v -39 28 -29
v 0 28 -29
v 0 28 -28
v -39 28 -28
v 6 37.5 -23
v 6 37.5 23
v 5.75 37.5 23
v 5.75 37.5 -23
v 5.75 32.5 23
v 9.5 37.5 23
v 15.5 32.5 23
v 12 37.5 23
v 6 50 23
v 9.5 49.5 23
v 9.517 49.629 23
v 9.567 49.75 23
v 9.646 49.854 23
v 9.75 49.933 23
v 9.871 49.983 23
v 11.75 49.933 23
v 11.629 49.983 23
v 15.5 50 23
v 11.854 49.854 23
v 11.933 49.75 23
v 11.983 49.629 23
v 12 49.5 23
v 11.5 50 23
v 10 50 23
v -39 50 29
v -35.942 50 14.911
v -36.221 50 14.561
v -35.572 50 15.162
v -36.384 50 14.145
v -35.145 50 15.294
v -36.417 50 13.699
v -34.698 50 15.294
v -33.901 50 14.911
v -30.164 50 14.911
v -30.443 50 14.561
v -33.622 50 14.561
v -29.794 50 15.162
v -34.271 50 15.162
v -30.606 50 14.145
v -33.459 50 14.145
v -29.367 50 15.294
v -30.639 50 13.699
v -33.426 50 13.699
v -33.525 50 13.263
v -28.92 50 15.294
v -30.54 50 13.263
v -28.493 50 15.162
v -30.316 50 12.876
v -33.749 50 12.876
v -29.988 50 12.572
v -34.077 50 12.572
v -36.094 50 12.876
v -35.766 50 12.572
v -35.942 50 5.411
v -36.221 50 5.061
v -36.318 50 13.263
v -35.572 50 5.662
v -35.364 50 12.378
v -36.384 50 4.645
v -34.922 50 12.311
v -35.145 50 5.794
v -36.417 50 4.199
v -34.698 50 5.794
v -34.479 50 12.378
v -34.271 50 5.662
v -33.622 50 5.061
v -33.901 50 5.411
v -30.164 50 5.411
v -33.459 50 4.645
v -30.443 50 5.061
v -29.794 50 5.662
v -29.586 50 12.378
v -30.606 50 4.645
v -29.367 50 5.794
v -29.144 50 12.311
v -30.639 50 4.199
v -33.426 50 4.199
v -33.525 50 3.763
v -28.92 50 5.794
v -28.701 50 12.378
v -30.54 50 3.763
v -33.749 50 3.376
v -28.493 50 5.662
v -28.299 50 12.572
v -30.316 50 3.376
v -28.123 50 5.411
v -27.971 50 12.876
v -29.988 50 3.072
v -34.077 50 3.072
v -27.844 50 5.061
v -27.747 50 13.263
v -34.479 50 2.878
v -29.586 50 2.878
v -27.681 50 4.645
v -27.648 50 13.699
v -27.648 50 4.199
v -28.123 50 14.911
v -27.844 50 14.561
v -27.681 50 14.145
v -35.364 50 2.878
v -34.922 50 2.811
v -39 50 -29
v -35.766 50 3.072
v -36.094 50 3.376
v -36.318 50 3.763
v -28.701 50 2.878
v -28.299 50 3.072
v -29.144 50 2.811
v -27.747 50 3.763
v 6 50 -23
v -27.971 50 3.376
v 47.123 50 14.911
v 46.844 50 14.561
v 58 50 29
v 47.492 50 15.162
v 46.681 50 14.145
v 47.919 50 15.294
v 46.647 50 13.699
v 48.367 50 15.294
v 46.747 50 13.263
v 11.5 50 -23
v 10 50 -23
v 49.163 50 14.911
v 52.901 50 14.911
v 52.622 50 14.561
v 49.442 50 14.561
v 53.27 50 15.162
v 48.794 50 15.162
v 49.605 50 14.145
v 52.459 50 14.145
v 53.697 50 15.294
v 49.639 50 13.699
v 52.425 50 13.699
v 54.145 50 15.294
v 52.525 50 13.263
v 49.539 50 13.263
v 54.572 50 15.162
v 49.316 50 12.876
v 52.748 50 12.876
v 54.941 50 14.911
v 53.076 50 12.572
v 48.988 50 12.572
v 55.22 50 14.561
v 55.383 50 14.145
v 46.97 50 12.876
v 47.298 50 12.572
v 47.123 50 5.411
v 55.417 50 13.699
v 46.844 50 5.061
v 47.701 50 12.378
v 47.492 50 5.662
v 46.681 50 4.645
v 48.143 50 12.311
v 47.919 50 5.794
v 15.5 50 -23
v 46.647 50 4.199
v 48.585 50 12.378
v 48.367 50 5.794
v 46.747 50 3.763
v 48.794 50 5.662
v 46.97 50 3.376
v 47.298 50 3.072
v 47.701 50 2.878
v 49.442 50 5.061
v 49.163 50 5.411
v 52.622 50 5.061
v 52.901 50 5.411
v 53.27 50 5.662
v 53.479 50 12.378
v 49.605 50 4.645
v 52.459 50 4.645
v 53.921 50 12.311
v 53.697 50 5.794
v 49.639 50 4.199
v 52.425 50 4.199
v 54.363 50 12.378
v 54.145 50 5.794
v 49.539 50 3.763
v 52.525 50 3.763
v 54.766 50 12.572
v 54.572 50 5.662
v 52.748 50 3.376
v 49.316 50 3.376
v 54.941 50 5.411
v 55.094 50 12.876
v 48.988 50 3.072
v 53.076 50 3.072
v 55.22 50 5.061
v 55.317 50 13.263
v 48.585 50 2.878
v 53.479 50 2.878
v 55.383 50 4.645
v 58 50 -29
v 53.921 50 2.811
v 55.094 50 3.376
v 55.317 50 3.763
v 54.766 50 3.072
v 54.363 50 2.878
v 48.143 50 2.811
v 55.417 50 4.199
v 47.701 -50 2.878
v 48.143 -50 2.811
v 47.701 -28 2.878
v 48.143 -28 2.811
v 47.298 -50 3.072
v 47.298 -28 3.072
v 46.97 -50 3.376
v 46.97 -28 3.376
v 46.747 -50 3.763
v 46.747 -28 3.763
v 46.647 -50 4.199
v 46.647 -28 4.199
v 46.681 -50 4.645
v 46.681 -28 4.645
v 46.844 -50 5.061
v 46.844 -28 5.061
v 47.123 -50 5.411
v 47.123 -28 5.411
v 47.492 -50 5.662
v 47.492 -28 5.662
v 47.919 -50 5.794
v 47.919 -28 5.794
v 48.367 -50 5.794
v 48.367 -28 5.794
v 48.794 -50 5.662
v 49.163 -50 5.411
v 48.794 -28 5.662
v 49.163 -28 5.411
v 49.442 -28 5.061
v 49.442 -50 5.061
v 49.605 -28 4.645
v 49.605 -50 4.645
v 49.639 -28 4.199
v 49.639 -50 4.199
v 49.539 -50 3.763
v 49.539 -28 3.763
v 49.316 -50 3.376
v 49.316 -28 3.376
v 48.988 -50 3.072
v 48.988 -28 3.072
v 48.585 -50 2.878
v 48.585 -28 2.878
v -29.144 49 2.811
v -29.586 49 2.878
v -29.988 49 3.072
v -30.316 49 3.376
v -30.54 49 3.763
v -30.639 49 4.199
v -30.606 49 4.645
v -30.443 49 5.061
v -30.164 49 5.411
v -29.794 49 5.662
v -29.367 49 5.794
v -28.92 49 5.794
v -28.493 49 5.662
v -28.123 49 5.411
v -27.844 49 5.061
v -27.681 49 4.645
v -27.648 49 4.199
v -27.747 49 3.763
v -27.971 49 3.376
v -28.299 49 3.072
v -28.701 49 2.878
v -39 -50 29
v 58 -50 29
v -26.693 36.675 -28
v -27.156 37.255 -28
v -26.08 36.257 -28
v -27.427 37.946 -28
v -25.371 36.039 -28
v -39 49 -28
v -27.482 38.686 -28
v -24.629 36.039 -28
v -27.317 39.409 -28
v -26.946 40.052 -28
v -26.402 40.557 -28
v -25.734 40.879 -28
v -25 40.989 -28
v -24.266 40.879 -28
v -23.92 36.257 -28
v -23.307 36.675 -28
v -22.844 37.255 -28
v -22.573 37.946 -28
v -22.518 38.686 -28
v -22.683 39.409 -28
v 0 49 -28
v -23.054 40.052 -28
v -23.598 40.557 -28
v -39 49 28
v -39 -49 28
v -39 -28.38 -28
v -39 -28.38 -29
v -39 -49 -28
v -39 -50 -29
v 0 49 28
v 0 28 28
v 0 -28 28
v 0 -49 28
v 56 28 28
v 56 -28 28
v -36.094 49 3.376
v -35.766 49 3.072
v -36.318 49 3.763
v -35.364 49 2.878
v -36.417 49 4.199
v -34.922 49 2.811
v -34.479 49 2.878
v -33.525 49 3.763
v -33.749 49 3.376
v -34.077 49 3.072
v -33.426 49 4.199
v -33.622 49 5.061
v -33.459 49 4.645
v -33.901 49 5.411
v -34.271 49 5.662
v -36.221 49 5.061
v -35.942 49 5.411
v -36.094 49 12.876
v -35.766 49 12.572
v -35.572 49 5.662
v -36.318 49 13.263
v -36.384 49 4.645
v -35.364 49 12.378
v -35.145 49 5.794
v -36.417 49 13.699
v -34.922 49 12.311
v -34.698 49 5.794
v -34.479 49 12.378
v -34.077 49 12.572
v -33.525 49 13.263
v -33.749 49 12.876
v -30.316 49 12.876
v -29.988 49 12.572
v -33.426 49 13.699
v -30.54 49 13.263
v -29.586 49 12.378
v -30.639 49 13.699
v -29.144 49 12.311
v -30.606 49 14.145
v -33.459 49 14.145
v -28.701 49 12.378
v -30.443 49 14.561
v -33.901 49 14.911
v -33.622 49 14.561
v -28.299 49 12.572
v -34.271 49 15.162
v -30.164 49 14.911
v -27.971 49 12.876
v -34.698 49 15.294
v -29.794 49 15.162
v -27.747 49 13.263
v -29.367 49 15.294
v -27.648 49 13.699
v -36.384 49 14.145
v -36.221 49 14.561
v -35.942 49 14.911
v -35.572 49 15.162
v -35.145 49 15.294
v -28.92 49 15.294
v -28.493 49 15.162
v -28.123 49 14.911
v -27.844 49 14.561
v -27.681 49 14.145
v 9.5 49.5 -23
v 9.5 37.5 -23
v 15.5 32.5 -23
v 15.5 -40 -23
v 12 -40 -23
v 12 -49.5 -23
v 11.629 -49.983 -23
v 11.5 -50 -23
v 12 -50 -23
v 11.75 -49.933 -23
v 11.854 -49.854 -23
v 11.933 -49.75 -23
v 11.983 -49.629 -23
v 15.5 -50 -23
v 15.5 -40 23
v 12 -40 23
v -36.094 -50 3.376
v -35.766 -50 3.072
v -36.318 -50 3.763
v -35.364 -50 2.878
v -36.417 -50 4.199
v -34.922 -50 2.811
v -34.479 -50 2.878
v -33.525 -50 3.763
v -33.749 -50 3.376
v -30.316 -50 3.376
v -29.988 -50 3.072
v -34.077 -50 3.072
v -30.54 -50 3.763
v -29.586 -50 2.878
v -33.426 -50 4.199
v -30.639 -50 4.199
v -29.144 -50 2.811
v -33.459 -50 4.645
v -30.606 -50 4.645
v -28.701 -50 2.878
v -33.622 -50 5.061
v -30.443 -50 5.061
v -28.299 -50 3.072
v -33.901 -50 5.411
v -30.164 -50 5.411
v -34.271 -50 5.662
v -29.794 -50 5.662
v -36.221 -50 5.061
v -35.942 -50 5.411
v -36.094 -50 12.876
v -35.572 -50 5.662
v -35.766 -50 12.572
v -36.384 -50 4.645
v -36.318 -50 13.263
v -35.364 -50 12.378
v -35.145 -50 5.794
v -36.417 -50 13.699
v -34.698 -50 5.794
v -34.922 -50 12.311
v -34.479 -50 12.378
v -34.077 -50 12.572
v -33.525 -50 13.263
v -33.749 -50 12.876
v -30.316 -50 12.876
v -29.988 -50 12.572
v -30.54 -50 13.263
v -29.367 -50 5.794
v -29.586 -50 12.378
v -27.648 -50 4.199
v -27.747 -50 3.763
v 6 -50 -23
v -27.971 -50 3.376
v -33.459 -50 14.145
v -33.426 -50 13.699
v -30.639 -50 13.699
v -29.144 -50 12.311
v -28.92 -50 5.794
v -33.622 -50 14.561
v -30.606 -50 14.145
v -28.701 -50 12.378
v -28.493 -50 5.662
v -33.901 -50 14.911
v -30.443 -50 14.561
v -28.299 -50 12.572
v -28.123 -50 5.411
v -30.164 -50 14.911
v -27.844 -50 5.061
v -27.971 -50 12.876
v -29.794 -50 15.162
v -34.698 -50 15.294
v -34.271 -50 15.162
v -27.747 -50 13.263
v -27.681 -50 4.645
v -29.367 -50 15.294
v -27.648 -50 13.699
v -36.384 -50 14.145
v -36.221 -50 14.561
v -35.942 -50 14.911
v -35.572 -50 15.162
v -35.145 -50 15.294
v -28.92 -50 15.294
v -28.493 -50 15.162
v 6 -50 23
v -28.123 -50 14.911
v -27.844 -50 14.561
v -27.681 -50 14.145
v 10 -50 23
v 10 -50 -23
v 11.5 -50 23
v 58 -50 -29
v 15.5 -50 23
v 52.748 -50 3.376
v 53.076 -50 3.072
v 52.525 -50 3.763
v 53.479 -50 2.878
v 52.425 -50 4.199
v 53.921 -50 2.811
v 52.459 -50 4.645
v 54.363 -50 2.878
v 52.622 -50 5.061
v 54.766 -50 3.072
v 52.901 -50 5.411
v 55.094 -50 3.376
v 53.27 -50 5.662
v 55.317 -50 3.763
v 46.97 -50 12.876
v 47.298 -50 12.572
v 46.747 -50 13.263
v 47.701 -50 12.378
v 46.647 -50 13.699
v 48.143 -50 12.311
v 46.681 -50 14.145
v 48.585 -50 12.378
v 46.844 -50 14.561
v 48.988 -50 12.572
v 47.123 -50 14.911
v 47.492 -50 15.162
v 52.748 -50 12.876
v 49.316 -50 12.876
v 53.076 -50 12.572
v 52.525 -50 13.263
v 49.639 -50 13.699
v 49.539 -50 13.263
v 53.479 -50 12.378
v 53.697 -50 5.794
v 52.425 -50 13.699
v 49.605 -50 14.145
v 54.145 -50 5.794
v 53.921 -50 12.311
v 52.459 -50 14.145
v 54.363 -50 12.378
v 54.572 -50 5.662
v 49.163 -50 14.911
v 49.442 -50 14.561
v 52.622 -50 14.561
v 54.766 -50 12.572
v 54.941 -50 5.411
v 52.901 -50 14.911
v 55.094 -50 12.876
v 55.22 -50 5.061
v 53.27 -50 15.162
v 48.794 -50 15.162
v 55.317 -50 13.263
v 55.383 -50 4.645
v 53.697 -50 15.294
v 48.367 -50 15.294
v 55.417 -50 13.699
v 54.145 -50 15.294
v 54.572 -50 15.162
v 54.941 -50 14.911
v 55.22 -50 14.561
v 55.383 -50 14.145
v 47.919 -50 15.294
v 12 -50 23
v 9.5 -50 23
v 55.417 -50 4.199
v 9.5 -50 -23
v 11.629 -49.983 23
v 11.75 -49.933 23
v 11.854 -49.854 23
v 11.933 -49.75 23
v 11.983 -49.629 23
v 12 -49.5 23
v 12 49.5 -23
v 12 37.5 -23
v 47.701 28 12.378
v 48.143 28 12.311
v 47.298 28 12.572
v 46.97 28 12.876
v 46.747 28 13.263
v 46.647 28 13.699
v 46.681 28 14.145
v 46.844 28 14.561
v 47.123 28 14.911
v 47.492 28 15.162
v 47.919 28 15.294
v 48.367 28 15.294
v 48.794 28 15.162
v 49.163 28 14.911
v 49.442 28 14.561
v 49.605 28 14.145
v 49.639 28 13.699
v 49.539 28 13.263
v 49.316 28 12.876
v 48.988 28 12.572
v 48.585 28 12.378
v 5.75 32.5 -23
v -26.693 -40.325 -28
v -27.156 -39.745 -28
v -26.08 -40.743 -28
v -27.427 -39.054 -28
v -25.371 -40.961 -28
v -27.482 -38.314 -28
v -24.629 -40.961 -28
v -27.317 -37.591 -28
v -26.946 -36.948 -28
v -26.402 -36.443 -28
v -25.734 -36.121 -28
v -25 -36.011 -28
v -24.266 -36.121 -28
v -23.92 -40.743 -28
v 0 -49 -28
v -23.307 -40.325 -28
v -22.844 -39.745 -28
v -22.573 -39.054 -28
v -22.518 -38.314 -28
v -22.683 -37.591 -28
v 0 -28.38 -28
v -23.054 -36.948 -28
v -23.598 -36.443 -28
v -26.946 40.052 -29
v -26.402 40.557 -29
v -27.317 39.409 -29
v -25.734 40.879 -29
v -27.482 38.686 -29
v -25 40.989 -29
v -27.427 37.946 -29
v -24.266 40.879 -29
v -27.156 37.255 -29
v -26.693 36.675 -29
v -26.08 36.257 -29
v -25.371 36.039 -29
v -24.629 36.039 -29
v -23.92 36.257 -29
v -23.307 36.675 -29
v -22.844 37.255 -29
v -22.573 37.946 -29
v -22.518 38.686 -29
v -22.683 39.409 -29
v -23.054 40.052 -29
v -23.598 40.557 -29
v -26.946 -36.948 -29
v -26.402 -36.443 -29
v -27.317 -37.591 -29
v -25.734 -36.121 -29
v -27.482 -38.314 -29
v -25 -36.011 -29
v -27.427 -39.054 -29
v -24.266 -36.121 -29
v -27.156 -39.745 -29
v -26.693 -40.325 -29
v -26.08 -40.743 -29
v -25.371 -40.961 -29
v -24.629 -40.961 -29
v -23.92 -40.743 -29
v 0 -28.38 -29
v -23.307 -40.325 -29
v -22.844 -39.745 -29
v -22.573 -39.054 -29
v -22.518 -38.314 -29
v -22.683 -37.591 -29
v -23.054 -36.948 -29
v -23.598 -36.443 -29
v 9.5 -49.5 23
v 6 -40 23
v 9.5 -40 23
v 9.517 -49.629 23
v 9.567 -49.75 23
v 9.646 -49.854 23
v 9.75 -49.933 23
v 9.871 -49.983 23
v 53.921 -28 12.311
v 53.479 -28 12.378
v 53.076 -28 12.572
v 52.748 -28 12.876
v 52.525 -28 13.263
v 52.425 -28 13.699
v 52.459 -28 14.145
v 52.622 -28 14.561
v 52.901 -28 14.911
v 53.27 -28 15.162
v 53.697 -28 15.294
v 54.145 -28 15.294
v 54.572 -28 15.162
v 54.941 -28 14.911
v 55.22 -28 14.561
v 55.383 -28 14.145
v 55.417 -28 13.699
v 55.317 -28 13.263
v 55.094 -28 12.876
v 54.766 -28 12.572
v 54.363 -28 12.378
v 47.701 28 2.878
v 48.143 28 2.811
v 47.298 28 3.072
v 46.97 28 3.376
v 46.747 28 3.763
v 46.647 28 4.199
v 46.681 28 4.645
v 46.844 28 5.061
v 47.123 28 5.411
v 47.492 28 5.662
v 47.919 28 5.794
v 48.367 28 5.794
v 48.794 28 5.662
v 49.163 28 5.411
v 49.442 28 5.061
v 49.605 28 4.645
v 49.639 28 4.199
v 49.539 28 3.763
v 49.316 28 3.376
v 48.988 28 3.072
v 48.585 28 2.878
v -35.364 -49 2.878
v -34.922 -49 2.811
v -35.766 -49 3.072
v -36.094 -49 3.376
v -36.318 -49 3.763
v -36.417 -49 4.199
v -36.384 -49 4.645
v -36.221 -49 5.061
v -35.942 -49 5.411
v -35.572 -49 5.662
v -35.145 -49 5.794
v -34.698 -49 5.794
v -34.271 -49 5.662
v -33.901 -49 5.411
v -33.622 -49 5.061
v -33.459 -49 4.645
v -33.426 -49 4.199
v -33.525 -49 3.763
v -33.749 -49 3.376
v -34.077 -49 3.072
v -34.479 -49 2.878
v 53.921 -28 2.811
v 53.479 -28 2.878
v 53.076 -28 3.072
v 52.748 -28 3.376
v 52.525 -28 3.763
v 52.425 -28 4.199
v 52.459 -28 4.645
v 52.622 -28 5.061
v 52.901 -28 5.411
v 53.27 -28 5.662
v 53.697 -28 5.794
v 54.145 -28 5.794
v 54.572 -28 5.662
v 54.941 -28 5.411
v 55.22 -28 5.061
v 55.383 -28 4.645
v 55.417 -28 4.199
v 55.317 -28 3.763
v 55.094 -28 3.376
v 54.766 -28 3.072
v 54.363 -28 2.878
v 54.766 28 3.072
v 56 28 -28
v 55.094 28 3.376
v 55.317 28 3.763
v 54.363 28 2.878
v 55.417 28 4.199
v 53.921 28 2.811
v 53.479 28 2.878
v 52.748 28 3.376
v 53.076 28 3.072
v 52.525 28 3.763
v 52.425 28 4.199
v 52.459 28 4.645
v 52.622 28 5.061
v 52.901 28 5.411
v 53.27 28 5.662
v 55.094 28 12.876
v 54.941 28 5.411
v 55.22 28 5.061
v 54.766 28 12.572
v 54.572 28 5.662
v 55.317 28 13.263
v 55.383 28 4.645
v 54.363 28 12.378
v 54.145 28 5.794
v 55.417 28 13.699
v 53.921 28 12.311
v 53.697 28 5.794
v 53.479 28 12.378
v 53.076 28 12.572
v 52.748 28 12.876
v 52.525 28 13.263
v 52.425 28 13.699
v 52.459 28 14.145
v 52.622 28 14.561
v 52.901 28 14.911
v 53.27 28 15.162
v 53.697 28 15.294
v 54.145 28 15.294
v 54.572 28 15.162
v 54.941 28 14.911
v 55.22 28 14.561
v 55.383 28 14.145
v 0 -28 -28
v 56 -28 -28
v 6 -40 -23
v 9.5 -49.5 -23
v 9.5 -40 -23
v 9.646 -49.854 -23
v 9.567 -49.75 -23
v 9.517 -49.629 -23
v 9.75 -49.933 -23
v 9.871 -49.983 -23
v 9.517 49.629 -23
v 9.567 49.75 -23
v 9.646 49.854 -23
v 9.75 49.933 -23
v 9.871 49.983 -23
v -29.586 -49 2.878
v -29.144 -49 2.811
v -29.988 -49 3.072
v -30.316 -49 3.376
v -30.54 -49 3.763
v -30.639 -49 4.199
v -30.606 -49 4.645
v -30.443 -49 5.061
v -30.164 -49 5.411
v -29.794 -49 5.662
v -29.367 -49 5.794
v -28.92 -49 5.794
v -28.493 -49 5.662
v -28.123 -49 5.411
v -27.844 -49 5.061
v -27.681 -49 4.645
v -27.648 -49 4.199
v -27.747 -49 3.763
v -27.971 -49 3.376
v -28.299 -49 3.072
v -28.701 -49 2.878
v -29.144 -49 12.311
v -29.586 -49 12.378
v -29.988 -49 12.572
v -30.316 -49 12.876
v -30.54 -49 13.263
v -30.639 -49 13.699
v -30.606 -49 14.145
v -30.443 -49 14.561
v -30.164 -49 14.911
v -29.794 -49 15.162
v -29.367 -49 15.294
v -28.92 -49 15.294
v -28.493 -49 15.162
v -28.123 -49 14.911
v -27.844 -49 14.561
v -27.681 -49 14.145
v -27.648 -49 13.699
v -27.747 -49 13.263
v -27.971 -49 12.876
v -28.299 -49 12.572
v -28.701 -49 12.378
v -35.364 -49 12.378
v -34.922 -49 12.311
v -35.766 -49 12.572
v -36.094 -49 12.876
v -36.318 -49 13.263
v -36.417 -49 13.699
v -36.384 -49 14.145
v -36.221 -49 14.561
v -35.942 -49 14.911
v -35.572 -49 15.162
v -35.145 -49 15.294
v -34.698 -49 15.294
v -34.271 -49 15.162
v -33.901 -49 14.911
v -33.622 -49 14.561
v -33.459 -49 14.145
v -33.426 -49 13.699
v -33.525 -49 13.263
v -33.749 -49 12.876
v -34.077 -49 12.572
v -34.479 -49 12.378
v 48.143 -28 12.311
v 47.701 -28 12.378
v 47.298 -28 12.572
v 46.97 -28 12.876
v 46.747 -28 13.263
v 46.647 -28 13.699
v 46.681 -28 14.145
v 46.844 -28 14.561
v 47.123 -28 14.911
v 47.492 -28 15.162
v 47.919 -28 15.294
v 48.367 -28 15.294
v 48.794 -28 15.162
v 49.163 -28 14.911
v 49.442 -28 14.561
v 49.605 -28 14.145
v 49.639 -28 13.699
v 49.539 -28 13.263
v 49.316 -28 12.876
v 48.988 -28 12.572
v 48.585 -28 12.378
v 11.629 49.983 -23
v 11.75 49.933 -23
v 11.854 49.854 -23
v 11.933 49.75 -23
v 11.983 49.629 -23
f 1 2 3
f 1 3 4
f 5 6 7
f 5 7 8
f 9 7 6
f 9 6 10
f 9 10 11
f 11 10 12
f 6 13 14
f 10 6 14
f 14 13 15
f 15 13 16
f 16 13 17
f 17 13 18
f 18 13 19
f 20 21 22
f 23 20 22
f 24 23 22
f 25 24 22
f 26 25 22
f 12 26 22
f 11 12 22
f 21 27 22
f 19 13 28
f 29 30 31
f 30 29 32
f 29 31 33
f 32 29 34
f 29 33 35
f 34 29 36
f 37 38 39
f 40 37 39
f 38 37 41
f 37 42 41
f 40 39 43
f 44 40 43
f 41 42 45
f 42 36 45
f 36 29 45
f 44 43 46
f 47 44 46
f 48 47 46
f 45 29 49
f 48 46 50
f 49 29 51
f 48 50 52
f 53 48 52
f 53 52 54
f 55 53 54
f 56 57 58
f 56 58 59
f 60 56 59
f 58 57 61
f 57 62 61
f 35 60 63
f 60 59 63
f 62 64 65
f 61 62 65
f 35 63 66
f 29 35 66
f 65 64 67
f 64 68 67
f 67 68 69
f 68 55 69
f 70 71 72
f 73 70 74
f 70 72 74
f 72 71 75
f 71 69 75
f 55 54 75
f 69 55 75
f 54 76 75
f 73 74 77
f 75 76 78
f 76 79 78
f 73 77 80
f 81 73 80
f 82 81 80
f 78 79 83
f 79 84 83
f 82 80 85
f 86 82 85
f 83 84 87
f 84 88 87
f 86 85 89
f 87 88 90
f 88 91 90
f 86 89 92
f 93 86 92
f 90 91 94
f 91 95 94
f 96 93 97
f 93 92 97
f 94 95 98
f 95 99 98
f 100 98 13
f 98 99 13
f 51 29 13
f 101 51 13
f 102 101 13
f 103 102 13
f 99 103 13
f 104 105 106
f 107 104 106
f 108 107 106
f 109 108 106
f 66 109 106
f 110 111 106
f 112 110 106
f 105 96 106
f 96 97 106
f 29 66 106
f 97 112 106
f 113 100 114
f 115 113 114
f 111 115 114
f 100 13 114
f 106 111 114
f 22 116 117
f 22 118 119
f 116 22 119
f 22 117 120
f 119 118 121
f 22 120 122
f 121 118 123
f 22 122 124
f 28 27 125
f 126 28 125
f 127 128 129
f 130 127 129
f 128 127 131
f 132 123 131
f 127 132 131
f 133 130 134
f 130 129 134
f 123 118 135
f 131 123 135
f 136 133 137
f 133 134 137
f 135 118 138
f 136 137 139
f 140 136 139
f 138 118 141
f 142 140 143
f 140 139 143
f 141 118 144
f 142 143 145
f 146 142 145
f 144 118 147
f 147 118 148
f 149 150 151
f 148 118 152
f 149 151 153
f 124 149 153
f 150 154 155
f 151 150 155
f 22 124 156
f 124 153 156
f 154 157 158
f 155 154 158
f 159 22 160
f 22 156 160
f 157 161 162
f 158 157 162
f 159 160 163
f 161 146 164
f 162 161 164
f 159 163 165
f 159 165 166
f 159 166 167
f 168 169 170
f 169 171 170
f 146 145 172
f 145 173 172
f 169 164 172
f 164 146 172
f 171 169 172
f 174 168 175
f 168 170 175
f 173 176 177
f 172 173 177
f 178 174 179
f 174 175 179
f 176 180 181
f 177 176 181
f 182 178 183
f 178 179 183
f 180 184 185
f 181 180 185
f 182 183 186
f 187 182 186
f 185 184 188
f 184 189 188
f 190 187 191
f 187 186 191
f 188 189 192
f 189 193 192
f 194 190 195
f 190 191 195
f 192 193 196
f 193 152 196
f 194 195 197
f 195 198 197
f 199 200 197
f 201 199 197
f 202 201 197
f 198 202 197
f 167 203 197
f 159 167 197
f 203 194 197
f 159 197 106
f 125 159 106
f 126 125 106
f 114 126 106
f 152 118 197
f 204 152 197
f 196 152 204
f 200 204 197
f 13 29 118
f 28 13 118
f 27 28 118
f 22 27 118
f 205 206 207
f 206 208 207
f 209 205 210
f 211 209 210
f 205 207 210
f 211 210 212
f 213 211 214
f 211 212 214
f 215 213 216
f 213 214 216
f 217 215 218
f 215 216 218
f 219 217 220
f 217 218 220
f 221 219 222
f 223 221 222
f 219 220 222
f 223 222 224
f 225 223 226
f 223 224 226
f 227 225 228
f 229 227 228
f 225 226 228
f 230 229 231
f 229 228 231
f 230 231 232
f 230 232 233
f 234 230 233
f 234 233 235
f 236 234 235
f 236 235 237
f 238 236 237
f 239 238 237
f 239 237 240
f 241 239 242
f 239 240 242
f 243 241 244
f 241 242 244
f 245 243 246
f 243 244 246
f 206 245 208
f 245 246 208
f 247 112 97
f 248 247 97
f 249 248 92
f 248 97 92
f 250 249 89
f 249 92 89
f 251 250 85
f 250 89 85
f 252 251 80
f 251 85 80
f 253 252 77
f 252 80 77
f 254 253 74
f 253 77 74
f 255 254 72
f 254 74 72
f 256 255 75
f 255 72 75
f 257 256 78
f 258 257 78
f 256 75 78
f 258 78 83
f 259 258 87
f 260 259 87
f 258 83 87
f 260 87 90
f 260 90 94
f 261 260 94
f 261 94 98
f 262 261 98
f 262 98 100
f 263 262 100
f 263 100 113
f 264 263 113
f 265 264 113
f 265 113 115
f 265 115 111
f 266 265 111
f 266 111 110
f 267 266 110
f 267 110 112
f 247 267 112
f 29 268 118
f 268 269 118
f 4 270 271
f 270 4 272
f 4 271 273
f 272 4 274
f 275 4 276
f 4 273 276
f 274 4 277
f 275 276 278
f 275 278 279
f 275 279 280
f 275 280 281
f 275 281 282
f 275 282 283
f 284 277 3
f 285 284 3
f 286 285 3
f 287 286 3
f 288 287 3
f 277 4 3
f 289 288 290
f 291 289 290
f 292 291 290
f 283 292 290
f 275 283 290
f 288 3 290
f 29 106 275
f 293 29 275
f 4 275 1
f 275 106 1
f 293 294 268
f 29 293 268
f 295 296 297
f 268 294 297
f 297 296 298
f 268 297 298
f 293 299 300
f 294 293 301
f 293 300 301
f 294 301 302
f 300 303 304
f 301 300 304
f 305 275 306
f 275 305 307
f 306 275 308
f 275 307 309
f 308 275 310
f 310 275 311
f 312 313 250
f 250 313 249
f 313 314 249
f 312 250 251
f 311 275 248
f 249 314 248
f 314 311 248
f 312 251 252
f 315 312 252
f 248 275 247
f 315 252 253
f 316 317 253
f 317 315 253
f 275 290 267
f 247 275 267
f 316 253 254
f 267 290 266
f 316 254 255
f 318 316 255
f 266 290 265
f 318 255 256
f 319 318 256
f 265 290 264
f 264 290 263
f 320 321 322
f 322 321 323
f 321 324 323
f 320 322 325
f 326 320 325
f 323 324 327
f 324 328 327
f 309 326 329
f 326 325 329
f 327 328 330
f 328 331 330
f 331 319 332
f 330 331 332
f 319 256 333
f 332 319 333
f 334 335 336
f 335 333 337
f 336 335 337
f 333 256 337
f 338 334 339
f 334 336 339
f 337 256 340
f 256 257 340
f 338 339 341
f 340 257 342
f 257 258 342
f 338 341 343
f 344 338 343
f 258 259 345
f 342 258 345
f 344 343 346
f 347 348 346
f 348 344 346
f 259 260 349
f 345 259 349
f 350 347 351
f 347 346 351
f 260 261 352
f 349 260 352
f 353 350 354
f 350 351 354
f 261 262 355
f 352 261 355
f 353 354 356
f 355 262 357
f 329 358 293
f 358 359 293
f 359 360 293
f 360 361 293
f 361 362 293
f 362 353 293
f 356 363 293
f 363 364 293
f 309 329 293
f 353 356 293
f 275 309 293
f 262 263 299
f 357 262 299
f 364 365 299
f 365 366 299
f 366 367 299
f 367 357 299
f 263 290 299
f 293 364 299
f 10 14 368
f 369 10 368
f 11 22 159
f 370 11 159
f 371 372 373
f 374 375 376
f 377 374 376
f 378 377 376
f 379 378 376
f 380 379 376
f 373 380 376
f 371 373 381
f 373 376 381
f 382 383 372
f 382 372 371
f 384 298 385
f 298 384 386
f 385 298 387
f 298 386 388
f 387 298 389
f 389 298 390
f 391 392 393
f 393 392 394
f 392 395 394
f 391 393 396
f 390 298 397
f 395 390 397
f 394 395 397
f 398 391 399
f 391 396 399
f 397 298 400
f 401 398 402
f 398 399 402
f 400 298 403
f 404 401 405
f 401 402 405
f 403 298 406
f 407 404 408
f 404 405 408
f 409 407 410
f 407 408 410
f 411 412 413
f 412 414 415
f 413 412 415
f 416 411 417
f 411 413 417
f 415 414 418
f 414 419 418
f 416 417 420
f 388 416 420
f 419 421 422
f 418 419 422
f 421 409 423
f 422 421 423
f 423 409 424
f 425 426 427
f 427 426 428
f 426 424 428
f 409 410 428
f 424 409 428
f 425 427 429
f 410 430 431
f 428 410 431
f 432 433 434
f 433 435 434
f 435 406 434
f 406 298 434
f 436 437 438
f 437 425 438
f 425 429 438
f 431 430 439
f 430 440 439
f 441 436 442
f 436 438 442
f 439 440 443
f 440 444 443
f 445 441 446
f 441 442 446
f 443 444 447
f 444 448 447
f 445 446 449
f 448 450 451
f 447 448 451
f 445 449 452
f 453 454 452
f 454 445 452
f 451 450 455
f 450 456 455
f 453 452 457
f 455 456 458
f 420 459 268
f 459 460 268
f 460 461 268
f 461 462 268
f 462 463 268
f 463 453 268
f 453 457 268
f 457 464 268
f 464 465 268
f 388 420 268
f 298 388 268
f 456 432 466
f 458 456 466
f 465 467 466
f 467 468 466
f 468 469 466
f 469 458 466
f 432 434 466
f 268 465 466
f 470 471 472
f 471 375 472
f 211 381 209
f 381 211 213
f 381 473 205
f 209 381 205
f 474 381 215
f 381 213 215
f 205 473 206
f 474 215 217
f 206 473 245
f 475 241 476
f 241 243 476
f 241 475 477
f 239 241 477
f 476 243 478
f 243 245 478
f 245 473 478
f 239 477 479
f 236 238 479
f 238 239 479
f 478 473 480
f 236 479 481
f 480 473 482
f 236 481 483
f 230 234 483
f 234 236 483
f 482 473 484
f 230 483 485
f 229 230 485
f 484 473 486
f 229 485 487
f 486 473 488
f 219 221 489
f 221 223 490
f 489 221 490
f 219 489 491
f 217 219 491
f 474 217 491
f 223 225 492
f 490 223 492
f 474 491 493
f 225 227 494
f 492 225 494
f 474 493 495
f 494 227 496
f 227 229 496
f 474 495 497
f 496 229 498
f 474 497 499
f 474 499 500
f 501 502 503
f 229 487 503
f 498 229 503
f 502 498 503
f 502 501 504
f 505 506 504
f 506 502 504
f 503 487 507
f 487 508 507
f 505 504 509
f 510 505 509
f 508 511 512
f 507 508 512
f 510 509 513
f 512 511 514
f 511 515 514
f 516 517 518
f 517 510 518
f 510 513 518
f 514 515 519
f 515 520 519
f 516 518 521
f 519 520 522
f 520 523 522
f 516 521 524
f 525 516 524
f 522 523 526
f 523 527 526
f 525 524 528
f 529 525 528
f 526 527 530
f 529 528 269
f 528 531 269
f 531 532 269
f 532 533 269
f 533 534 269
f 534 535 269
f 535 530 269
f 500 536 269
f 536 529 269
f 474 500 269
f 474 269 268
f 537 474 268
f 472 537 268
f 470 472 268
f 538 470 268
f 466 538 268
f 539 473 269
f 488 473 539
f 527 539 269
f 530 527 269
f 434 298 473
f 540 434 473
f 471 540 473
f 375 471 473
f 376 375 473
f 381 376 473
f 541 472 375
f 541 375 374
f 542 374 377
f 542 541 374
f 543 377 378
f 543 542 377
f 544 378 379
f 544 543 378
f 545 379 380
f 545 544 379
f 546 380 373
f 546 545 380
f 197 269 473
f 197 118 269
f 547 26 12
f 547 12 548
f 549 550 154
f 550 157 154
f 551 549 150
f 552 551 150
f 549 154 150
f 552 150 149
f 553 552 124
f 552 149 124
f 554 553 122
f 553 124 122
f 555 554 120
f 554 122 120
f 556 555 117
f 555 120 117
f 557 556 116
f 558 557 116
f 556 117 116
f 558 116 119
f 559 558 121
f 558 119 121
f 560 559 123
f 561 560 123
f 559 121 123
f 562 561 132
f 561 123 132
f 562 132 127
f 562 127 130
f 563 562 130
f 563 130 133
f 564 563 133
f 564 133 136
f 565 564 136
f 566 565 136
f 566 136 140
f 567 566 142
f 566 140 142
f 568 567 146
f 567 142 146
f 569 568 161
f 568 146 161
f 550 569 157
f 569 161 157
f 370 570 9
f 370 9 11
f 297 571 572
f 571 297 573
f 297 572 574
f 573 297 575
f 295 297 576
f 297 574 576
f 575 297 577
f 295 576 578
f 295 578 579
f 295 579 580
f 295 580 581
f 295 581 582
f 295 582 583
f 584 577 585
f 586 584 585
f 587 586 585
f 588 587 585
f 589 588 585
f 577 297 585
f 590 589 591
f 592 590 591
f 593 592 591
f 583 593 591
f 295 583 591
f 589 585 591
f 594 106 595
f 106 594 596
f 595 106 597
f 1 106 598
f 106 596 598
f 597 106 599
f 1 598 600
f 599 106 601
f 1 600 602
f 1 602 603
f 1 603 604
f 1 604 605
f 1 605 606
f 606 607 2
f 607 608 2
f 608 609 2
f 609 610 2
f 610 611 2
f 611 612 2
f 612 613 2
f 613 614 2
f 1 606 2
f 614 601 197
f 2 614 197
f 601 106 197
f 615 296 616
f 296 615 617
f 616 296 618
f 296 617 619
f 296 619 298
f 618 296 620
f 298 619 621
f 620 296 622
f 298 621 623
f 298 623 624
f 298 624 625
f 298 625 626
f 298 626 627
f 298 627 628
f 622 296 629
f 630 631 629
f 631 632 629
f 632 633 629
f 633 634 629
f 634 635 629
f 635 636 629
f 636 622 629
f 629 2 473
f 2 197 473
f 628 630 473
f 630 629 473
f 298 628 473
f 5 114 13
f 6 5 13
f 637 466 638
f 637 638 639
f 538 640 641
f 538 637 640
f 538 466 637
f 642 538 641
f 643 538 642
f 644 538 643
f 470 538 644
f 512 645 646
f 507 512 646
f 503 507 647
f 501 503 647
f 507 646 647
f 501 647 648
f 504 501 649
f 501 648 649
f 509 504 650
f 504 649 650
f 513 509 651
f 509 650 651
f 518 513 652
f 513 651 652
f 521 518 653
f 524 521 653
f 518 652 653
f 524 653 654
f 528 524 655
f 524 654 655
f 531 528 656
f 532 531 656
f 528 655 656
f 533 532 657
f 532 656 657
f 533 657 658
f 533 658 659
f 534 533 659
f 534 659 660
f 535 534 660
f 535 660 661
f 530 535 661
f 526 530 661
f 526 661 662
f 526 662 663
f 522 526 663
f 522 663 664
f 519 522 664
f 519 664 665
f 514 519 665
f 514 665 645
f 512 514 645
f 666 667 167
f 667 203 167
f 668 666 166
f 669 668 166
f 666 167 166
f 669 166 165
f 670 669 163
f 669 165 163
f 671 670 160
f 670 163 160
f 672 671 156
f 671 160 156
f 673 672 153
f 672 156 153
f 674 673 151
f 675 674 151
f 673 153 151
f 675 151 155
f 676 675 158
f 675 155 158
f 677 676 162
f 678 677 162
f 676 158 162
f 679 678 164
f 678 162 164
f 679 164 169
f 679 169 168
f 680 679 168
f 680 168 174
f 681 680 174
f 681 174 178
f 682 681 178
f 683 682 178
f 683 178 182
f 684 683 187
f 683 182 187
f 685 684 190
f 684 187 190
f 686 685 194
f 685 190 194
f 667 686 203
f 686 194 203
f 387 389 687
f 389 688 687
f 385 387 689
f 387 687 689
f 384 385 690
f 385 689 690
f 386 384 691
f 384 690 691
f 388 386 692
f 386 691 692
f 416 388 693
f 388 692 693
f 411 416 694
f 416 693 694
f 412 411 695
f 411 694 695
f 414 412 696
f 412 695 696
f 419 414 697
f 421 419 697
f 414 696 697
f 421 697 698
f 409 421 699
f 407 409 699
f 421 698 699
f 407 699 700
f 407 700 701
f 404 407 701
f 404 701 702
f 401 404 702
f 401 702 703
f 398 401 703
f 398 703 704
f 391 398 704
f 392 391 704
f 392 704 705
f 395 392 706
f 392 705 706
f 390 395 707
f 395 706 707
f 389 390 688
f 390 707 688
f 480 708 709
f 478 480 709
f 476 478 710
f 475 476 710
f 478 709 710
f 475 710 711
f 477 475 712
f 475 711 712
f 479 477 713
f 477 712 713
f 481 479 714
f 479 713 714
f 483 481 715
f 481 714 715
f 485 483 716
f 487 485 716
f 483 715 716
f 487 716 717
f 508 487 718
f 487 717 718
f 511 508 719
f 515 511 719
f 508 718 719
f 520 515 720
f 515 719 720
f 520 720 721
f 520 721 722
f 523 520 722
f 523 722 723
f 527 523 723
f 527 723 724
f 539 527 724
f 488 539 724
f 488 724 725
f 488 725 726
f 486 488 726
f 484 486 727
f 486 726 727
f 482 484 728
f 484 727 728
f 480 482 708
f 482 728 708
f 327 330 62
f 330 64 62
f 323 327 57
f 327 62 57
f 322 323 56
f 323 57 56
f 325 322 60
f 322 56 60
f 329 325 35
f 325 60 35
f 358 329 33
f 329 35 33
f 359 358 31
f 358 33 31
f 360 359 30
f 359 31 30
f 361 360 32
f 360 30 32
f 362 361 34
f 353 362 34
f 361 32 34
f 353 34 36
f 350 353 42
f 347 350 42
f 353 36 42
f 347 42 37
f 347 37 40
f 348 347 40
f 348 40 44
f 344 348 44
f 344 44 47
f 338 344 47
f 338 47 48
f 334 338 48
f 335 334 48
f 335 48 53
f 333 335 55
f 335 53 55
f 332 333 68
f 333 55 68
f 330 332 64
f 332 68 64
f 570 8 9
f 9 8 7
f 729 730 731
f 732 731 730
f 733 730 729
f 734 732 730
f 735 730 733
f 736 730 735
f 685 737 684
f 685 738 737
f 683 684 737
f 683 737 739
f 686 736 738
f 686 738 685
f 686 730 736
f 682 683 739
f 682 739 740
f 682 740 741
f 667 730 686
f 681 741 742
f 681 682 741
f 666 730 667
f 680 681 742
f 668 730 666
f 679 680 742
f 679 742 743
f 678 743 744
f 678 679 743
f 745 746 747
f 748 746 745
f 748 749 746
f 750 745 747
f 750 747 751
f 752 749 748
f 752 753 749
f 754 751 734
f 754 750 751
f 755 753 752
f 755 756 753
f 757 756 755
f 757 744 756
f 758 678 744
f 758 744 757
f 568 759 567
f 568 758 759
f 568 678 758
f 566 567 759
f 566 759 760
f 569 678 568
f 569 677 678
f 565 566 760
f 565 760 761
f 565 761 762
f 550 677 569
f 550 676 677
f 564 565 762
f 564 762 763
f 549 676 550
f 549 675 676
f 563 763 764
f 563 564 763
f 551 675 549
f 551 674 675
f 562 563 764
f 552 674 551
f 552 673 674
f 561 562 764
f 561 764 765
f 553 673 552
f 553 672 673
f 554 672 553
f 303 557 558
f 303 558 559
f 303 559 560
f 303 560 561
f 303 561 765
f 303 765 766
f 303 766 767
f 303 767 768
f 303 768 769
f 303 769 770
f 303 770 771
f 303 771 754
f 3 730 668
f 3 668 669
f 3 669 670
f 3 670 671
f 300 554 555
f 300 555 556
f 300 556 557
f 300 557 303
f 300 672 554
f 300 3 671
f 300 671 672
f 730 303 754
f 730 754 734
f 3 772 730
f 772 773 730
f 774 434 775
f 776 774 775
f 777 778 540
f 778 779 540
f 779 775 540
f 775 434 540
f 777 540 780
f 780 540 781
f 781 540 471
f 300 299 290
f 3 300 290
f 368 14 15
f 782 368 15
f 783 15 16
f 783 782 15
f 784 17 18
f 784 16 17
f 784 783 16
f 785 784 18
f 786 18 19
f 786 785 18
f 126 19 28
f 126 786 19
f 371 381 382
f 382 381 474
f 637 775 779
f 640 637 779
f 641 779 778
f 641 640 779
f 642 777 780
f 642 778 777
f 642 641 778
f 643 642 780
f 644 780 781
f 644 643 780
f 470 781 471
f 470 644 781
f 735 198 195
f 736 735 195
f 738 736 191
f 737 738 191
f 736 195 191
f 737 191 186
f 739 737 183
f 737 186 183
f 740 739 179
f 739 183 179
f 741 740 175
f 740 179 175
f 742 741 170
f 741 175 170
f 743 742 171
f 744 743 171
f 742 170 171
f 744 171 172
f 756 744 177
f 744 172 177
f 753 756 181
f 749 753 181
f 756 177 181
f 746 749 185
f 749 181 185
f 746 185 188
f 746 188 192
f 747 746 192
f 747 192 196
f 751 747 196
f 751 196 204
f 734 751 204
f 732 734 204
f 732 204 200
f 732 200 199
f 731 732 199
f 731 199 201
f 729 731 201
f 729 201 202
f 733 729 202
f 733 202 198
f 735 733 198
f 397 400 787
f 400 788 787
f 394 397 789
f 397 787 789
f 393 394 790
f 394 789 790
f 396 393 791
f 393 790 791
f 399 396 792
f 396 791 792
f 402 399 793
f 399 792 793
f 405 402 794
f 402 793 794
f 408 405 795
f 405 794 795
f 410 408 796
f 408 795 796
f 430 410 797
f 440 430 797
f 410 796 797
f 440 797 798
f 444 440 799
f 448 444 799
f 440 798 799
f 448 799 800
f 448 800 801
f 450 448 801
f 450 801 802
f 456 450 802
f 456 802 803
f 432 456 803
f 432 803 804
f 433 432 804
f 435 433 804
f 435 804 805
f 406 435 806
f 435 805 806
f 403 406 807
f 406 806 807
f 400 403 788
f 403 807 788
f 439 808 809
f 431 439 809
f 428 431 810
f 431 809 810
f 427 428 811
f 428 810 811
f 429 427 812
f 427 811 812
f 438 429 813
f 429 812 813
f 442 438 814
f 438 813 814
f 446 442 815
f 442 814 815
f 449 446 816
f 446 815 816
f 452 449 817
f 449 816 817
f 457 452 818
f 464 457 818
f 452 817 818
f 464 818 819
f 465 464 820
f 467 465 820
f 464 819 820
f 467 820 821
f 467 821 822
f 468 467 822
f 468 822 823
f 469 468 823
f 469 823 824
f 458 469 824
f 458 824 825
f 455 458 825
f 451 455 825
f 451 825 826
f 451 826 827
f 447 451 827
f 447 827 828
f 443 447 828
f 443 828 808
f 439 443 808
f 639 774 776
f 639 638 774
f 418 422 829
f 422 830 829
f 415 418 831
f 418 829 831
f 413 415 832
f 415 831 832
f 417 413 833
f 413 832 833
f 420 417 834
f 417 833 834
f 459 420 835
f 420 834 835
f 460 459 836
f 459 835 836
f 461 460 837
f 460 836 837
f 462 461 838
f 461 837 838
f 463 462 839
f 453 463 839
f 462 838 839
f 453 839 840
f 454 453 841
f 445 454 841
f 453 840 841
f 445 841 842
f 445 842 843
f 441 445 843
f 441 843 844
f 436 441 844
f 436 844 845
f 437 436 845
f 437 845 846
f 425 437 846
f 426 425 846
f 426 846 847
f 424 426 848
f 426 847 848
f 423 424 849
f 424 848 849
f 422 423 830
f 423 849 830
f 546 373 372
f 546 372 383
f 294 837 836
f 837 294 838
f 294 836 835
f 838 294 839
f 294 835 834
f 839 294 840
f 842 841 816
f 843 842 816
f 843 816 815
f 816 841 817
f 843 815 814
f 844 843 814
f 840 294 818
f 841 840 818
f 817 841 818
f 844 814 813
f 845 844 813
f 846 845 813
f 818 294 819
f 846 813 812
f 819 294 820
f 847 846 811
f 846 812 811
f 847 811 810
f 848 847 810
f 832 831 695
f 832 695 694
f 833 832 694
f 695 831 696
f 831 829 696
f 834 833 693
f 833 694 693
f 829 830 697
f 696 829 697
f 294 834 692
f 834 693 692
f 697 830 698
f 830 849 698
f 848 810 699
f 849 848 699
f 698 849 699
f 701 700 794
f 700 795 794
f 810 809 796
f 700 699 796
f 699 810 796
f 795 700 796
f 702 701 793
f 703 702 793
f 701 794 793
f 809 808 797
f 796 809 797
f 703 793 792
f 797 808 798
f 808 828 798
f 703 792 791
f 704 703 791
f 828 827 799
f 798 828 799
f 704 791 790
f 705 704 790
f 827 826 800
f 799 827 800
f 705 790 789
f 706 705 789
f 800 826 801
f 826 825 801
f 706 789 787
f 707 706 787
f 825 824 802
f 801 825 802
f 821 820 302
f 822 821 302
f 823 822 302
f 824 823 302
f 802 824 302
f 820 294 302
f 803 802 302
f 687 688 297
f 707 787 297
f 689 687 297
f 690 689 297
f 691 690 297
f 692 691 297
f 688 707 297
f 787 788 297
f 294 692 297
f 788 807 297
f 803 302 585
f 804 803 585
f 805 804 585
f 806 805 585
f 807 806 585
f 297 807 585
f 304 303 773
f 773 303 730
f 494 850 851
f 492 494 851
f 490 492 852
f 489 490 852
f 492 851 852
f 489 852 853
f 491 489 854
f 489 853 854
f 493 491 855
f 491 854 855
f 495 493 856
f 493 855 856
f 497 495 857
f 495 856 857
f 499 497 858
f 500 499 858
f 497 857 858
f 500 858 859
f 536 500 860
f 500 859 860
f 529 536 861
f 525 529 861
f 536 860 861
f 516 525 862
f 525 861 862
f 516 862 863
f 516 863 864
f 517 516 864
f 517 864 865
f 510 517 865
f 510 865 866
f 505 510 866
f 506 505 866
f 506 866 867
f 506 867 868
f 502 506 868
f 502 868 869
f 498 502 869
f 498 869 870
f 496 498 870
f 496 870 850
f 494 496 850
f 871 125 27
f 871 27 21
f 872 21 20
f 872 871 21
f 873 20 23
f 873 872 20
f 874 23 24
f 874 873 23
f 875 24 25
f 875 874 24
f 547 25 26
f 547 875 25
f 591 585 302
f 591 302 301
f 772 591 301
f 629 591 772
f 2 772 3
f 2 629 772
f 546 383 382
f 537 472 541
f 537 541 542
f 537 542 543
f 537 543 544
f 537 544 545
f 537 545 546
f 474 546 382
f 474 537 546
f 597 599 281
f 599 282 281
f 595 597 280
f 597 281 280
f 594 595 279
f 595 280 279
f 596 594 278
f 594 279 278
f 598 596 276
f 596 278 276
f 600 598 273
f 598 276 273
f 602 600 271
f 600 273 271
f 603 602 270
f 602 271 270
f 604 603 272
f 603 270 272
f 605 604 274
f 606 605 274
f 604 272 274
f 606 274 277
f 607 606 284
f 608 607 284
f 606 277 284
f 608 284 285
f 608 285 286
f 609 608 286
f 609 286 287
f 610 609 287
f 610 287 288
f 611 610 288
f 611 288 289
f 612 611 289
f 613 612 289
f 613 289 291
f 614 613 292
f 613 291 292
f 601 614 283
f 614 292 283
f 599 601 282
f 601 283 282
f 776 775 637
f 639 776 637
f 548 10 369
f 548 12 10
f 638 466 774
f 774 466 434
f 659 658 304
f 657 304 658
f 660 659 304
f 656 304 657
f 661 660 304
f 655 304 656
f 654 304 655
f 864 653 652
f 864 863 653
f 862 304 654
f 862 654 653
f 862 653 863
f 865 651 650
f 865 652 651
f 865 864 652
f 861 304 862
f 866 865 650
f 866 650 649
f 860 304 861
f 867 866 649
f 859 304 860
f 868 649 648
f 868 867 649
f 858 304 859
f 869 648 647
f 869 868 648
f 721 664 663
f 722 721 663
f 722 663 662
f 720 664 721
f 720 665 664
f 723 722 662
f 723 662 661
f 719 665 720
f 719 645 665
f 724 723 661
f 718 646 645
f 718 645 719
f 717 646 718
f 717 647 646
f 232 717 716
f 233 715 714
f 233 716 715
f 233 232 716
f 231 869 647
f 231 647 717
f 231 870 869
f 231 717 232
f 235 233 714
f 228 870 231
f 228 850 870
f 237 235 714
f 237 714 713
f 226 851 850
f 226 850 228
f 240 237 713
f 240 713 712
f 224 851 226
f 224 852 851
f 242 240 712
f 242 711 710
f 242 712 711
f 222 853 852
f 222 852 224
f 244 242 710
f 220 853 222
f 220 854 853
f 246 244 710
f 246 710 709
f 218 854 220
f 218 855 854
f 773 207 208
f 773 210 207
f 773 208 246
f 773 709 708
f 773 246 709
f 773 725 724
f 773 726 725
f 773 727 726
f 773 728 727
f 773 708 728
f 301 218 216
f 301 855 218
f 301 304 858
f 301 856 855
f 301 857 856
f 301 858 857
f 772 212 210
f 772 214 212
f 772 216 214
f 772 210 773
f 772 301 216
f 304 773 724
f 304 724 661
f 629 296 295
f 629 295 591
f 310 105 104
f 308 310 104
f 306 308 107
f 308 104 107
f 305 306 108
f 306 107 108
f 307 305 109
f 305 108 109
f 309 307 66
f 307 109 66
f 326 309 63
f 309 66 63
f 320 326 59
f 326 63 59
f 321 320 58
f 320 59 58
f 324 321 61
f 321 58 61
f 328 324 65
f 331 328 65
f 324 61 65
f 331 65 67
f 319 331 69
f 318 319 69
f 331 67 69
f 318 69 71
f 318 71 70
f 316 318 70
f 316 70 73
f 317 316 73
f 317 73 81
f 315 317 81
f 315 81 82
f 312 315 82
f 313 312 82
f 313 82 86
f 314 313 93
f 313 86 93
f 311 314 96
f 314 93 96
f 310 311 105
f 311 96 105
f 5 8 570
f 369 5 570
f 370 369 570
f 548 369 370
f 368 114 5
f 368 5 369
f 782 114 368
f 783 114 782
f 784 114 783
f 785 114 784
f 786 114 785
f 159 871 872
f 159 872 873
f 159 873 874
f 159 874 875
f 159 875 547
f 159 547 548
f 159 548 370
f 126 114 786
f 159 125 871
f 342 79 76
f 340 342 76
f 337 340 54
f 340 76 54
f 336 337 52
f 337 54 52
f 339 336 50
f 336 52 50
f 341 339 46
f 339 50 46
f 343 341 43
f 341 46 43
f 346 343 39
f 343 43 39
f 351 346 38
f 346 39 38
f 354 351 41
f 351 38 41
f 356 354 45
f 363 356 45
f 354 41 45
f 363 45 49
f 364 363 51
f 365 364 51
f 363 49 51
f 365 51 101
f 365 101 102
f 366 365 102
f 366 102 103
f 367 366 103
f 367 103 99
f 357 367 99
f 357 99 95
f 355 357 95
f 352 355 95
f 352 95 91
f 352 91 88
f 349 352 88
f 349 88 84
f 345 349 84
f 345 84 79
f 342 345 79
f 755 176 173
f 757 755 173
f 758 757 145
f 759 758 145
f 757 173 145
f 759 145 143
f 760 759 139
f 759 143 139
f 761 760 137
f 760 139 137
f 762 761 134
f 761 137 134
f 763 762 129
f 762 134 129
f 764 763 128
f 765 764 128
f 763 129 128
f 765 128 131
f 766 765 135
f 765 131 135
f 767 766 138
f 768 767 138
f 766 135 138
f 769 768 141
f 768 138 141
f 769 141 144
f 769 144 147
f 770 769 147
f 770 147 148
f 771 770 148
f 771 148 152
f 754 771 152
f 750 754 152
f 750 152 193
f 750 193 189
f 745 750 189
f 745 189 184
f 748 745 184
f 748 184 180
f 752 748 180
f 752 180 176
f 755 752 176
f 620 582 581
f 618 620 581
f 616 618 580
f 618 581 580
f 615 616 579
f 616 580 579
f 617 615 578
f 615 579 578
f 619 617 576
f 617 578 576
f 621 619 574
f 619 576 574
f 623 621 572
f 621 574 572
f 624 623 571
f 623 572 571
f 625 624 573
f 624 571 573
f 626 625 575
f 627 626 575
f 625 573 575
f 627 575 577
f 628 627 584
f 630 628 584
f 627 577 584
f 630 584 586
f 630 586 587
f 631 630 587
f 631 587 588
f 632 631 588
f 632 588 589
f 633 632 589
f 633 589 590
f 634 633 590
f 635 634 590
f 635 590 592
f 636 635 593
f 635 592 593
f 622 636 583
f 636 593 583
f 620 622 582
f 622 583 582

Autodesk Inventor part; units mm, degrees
ref_plane "YZ Plane" through (0, 0, 0) normal (1, 0, 0) x (0, 1, 0)
ref_plane "XZ Plane" through (0, 0, 0) normal (0, 1, 0) x (-1, 0, 0)
ref_plane "XY Plane" through (0, 0, 0) normal (0, 0, 1) x (1, 0, 0)
sketch "Szkic1" plane through (0, 0, 0) normal (1, 0, 0) x (0, 1, 0)
  line L0 (29, 29) -> (-29, 29)
  line L1 (-29, 29) -> (-29, -29)
  line L2 (-29, -29) -> (29, -29)
  line L3 (29, -29) -> (29, 29)
  line L4 (28, 28) -> (-28, 28)
  line L5 (-28, 28) -> (-28, -28)
  line L6 (-28, -28) -> (28, -28)
  line L7 (28, -28) -> (28, 28)
  point P0 (0, 0)
  dimension "d0" = 58
  dimension "d1" = 58
  dimension "d2" = 56
  dimension "d3" = 56
extrude "Wyciągnięcie proste1" add sketch "Szkic1" along normal blind 56
sketch "Szkic2" plane through (56, 0, 0) normal (1, 0, 0) x (0, 0, -1)
  line L0 (29, 29) -> (-29, 29) projected
  line L1 (29, -29) -> (29, 29) projected
  line L2 (-29, 29) -> (29, 29)
  line L3 (29, 29) -> (29, -29)
  line L4 (29, -29) -> (-29, -29)
  line L5 (-29, -29) -> (-29, 29)
  point P0 (0, 0)
extrude "Wyciągnięcie proste2" add sketch "Szkic2" along normal blind 2
sketch "Szkic3" plane through (0, 0, 0) normal (-1, 0, 0) x (0, 0, 1)
  line L0 (29, 50) -> (-29, 50)
  line L1 (-29, 50) -> (-29, -50)
  line L2 (-29, -50) -> (29, -50)
  line L3 (29, -50) -> (29, 50)
  line L4 (-28, 49) -> (28, 49)
  line L5 (28, 49) -> (28, -49)
  line L6 (28, -49) -> (-28, -49)
  line L7 (-28, -49) -> (-28, 49)
  point P0 (0, 0)
  dimension "d8" = 100
  dimension "d9" = 98
extrude "Wyciągnięcie proste3" add sketch "Szkic3" along normal blind 50
sketch "Szkic4" plane through (0, 0, 0) normal (1, 0, 0) x (0, 0, -1)
  line L0 (-29, 29) -> (-29, 50) projected
  line L1 (29, -29) -> (29, 29) projected
  line L2 (-29, 50) -> (29, 50)
  line L3 (29, 50) -> (29, 29)
  line L4 (29, 29) -> (-29, 29)
  line L5 (-29, 29) -> (-29, 50)
  line L6 (29, -50) -> (-29, -50) projected
  line L7 (-29, -29) -> (29, -29)
  line L8 (29, -29) -> (29, -50)
  line L9 (29, -50) -> (-29, -50)
  line L10 (-29, -50) -> (-29, -29)
  point P0 (0, 0)
extrude "Wyciągnięcie proste4" add sketch "Szkic4" along normal blind 1
sketch "Szkic5" plane through (58, -29, -29) normal (0, 0, -1) x (-1, 0, 0)
  line L0 (108, 78) -> (108, -20) projected
  line L1 (58, 57) -> (108, 57)
  line L2 (108, 57) -> (108, 0.6199)
  line L3 (108, 0.6199) -> (58, 0.6199)
  line L4 (58, 0.6199) -> (58, 57)
  point P0 (58, 29)
extrude "Wyciągnięcie proste5" cut sketch "Szkic5" against normal blind 1
sketch "Szkic6" plane through (58, -29, -29) normal (0, 0, -1) x (-1, 0, 0)
  line L0 (108, 57) -> (58, 57) projected
  line L1 (83, 57) -> (83, 78)
  line L2 (58, 78) -> (108, 78) projected
  line L3 (108, 57) -> (108, 78) projected
  line L4 (108, 67.5) -> (57, 67.5)
  line L5 (57, 58) -> (57, 79) projected
  line L6 (58, -20) -> (108, -20) projected
  line L7 (83, -20) -> (83, 0.6199)
  line L8 (58, 0.6199) -> (108, 0.6199) projected
  line L9 (58, -20) -> (58, 1) projected
  line L10 (58, -9.5) -> (108, -9.5)
  line L11 (108, 0.6199) -> (108, -21) projected
  circle A0 centre (83, 67.5) radius 1.5
  circle A1 centre (83, -9.5) radius 1.5
  point P0 (58, 29)
  dimension "d16" = 3
  dimension "d17" = 3
hole "Otwór1" at (-25, 38.5, -29) at (-25, -38.5, -29) direction (0, 0, 1) diameter 4.9784 depth 1 tip angle 118 thread size "1/4-20 UNC" class "2B" standard "ANSI Unified Screw Threads"
sketch "Szkic7" plane through (58, -29, 29) normal (0, 0, 1) x (1, 0, 0)
  line L0 (-57, 79) -> (-57, 58) projected
  line L1 (-57, 79) -> (0, 79)
  line L2 (0, 58) -> (0, 0) projected
  line L3 (0, 79) -> (0, 58)
  line L4 (-57, -21) -> (-108, -21) projected
  line L5 (-57, -21) -> (0, -21)
  line L6 (0, -21) -> (0, 0)
  line L7 (-57, 58) -> (0, 58) projected
  line L8 (0, 58) -> (-57, 58)
  line L9 (-57, 58) -> (-57, 79)
  line L10 (-57, -21) -> (-57, 0)
  line L11 (-57, 0) -> (0, 0)
  point P0 (-58, 29)
extrude "Wyciągnięcie proste6" add sketch "Szkic7" against normal blind 58
sketch "Szkic8" plane through (58, 50, -29) normal (0, 0, -1) x (-1, 0, 0)
  line L0 (0, 0) -> (108, 0) projected
  line L1 (108, 0) -> (97, 0)
  line L2 (97, 0) -> (97, -100)
  line L3 (0, -100) -> (108, -100) projected
  line L4 (108, -100) -> (97, -100)
  line L5 (108, -100) -> (108, 0)
  line L6 (97, 0) -> (108, 0)
  point P0 (58, -50)
  dimension "d27" = 11
extrude "Wyciągnięcie proste7" cut sketch "Szkic8" against normal blind 58
sketch "Szkic9" plane through (58, -50, -29) normal (0, -1, 0) x (1, 0, 0)
  line L0 (0, 58) -> (-97, 58) projected
  line L1 (-97, 0) -> (-97, 58) projected
  line L2 (-92.9215, 33.311) -> (-92.9215, 42.811)
  line L3 (0, 0) -> (-97, 0) projected
  line L4 (-87.1435, 33.311) -> (-97, 33.311)
  line L5 (-87.1435, 33.311) -> (-87.1435, 42.811)
  line L6 (-87.1435, 42.811) -> (-92.9215, 42.811)
  line L7 (-92.9215, 42.811) -> (-92.9215, 33.311)
  line L8 (-97, 0) -> (-48.5, 0)
  line L9 (0, 58) -> (0, 0) projected
  point P0 (-9.857, 42.811)
  point P1 (-9.857, 33.311)
  point P2 (-4.079, 33.311)
  point P3 (-4.079, 42.811)
  dimension "d54" = 5.778
  dimension "d59" = 5.778
  dimension "d60" = 33.311
  dimension "d61" = 9.5
  dimension "d68" = 4.0785
  dimension "d70" = 9.5
  dimension "d71" = 9.5
  dimension "d72" = 5.778
  dimension "d73" = 5.778
  dimension "d74" = 4.079
  dimension "d75" = 77.2865
  dimension "d76" = 77.2865
hole "Otwór2" at (-29.1435, -50, 4.311) at (-29.1435, -50, 13.811) at (-34.9215, -50, 4.311) at (-34.9215, -50, 13.811) at (48.143, -50, 13.811) at (53.921, -50, 13.811) at (53.921, -50, 4.311) at (48.143, -50, 4.311) direction (0, 1, 0) diameter 3 end through all
sketch "Szkic10" plane through (58, 50, 29) normal (0, 1, 0) x (1, 0, 0)
  line L0 (0, 0) -> (-97, 0)
  line L1 (-58, 1) -> (-97, 1) projected
  line L2 (0, 58) -> (-97, 58) projected
  line L3 (-97, 0) -> (-97, 58)
  line L4 (-97, 58) -> (0, 58)
  line L5 (0, 58) -> (0, 0)
  line L6 (-58, 1) -> (-2, 1) projected
  line L7 (-48.5, 1) -> (-48.5, 58)
  line L8 (-48.5, 58) -> (-53.5, 58)
  line L9 (-53.5, 58) -> (-54.5822, 58)
  line L10 (-48.5, 58) -> (-53.5, 58)
  line L11 (-48.5, 58) -> (-51, 58)
  line L12 (-48.5, 1) -> (-46, 1)
  line L13 (-46, 1) -> (-46, 58)
  line L14 (-46, 1) -> (-46, 0)
  line L15 (-48.5, 1) -> (-48.5, 0)
  line L16 (-48.5, 58) -> (-46, 58)
  line L17 (-46, 0) -> (-42.5, 0)
  line L18 (-42.5, 0) -> (-42.5, 58)
  line L19 (-48.5, 58) -> (-52, 58)
  line L20 (-52, 58) -> (-52, 0)
  line L21 (-48.5, 0) -> (-52, 0)
  line L22 (-52, 58) -> (-52, 52)
  line L23 (-52, 52) -> (-42.5, 52)
  line L24 (-52, 0) -> (-52, 6)
  line L25 (-52, 6) -> (-42.5, 6)
  point P0 (-58, 29)
  point P1 (-46, 6)
  point P2 (-46, 52)
  point P3 (-48.5, 6)
  point P4 (-48.5, 52)
  dimension "d78" = 2.5
  dimension "d79" = 3.5
  dimension "d80" = 3.5
  dimension "d81" = 6
  dimension "d82" = 6
extrude "Wyciągnięcie proste8" cut sketch "Szkic10" against normal blind 17.5 contours L25 L13 L23 L18 | L25 L20 L23 L7
sketch "Szkic11" plane through (15.5, 50, -23) normal (-1, 0, 0) x (0, 0, 1)
  line L0 (0, -17.5) -> (46, -17.5) projected
  line L1 (46, -17.5) -> (46, -12.5)
  line L2 (46, 0) -> (46, -17.5) projected
  line L3 (46, -12.5) -> (0, -12.5)
  line L4 (0, 0) -> (0, -17.5) projected
  line L5 (0, -17.5) -> (46, -17.5)
  line L6 (0, -17.5) -> (0, -12.5)
  line L7 (46, -12.5) -> (46, -17.5)
  point P0 (23, -50)
  dimension "d85" = 5
extrude "Wyciągnięcie proste9" cut sketch "Szkic11" along normal blind 9.75
fillet "Zaokrąglenie1" radius 0.5 2 edges at (9.5, 50, 0) (12, 50, 0)
sketch "Szkic12" plane through (58, -50, -29) normal (0, -1, 0) x (1, 0, 0)
  line L0 (0, 0) -> (-97, 0)
  line L1 (-97, 0) -> (-97, 58)
  line L2 (-97, 58) -> (0, 58)
  line L3 (0, 58) -> (0, 0)
  line L4 (-48.5, 1) -> (-48.5, 58)
  line L5 (-48.5, 58) -> (-53.5, 58)
  line L6 (-53.5, 58) -> (-54.5822, 58)
  line L7 (-48.5, 58) -> (-53.5, 58)
  line L8 (-48.5, 58) -> (-51, 58)
  line L9 (-48.5, 1) -> (-46, 1)
  line L10 (-46, 1) -> (-46, 58)
  line L11 (-46, 1) -> (-46, 0)
  line L12 (-48.5, 1) -> (-48.5, 0)
  line L13 (-48.5, 58) -> (-46, 58)
  line L14 (-46, 0) -> (-42.5, 0)
  line L15 (-42.5, 0) -> (-42.5, 58)
  line L16 (-48.5, 58) -> (-52, 58)
  line L17 (-52, 58) -> (-52, 0)
  line L18 (-48.5, 0) -> (-52, 0)
  line L19 (-52, 58) -> (-52, 52)
  line L20 (-52, 52) -> (-42.5, 52)
  line L21 (-52, 0) -> (-52, 6)
  line L22 (-52, 6) -> (-42.5, 6)
  point P0 (-58, 29)
  point P1 (-46, 6)
  point P2 (-46, 52)
  point P3 (-48.5, 6)
  point P4 (-48.5, 52)
  dimension "d89" = 2.5
  dimension "d90" = 3.5
  dimension "d91" = 3.5
  dimension "d92" = 6
  dimension "d93" = 6
extrude "Wyciągnięcie proste10" cut sketch "Szkic12" against normal blind 10 contours L22 L10 L20 L15 | L22 L17 L20 L4
fillet "Zaokrąglenie2" radius 0.5 2 edges at (12, -50, 0) (9.5, -50, 0)
properties part number "obudowa_silnik_H100_L11_W56"
